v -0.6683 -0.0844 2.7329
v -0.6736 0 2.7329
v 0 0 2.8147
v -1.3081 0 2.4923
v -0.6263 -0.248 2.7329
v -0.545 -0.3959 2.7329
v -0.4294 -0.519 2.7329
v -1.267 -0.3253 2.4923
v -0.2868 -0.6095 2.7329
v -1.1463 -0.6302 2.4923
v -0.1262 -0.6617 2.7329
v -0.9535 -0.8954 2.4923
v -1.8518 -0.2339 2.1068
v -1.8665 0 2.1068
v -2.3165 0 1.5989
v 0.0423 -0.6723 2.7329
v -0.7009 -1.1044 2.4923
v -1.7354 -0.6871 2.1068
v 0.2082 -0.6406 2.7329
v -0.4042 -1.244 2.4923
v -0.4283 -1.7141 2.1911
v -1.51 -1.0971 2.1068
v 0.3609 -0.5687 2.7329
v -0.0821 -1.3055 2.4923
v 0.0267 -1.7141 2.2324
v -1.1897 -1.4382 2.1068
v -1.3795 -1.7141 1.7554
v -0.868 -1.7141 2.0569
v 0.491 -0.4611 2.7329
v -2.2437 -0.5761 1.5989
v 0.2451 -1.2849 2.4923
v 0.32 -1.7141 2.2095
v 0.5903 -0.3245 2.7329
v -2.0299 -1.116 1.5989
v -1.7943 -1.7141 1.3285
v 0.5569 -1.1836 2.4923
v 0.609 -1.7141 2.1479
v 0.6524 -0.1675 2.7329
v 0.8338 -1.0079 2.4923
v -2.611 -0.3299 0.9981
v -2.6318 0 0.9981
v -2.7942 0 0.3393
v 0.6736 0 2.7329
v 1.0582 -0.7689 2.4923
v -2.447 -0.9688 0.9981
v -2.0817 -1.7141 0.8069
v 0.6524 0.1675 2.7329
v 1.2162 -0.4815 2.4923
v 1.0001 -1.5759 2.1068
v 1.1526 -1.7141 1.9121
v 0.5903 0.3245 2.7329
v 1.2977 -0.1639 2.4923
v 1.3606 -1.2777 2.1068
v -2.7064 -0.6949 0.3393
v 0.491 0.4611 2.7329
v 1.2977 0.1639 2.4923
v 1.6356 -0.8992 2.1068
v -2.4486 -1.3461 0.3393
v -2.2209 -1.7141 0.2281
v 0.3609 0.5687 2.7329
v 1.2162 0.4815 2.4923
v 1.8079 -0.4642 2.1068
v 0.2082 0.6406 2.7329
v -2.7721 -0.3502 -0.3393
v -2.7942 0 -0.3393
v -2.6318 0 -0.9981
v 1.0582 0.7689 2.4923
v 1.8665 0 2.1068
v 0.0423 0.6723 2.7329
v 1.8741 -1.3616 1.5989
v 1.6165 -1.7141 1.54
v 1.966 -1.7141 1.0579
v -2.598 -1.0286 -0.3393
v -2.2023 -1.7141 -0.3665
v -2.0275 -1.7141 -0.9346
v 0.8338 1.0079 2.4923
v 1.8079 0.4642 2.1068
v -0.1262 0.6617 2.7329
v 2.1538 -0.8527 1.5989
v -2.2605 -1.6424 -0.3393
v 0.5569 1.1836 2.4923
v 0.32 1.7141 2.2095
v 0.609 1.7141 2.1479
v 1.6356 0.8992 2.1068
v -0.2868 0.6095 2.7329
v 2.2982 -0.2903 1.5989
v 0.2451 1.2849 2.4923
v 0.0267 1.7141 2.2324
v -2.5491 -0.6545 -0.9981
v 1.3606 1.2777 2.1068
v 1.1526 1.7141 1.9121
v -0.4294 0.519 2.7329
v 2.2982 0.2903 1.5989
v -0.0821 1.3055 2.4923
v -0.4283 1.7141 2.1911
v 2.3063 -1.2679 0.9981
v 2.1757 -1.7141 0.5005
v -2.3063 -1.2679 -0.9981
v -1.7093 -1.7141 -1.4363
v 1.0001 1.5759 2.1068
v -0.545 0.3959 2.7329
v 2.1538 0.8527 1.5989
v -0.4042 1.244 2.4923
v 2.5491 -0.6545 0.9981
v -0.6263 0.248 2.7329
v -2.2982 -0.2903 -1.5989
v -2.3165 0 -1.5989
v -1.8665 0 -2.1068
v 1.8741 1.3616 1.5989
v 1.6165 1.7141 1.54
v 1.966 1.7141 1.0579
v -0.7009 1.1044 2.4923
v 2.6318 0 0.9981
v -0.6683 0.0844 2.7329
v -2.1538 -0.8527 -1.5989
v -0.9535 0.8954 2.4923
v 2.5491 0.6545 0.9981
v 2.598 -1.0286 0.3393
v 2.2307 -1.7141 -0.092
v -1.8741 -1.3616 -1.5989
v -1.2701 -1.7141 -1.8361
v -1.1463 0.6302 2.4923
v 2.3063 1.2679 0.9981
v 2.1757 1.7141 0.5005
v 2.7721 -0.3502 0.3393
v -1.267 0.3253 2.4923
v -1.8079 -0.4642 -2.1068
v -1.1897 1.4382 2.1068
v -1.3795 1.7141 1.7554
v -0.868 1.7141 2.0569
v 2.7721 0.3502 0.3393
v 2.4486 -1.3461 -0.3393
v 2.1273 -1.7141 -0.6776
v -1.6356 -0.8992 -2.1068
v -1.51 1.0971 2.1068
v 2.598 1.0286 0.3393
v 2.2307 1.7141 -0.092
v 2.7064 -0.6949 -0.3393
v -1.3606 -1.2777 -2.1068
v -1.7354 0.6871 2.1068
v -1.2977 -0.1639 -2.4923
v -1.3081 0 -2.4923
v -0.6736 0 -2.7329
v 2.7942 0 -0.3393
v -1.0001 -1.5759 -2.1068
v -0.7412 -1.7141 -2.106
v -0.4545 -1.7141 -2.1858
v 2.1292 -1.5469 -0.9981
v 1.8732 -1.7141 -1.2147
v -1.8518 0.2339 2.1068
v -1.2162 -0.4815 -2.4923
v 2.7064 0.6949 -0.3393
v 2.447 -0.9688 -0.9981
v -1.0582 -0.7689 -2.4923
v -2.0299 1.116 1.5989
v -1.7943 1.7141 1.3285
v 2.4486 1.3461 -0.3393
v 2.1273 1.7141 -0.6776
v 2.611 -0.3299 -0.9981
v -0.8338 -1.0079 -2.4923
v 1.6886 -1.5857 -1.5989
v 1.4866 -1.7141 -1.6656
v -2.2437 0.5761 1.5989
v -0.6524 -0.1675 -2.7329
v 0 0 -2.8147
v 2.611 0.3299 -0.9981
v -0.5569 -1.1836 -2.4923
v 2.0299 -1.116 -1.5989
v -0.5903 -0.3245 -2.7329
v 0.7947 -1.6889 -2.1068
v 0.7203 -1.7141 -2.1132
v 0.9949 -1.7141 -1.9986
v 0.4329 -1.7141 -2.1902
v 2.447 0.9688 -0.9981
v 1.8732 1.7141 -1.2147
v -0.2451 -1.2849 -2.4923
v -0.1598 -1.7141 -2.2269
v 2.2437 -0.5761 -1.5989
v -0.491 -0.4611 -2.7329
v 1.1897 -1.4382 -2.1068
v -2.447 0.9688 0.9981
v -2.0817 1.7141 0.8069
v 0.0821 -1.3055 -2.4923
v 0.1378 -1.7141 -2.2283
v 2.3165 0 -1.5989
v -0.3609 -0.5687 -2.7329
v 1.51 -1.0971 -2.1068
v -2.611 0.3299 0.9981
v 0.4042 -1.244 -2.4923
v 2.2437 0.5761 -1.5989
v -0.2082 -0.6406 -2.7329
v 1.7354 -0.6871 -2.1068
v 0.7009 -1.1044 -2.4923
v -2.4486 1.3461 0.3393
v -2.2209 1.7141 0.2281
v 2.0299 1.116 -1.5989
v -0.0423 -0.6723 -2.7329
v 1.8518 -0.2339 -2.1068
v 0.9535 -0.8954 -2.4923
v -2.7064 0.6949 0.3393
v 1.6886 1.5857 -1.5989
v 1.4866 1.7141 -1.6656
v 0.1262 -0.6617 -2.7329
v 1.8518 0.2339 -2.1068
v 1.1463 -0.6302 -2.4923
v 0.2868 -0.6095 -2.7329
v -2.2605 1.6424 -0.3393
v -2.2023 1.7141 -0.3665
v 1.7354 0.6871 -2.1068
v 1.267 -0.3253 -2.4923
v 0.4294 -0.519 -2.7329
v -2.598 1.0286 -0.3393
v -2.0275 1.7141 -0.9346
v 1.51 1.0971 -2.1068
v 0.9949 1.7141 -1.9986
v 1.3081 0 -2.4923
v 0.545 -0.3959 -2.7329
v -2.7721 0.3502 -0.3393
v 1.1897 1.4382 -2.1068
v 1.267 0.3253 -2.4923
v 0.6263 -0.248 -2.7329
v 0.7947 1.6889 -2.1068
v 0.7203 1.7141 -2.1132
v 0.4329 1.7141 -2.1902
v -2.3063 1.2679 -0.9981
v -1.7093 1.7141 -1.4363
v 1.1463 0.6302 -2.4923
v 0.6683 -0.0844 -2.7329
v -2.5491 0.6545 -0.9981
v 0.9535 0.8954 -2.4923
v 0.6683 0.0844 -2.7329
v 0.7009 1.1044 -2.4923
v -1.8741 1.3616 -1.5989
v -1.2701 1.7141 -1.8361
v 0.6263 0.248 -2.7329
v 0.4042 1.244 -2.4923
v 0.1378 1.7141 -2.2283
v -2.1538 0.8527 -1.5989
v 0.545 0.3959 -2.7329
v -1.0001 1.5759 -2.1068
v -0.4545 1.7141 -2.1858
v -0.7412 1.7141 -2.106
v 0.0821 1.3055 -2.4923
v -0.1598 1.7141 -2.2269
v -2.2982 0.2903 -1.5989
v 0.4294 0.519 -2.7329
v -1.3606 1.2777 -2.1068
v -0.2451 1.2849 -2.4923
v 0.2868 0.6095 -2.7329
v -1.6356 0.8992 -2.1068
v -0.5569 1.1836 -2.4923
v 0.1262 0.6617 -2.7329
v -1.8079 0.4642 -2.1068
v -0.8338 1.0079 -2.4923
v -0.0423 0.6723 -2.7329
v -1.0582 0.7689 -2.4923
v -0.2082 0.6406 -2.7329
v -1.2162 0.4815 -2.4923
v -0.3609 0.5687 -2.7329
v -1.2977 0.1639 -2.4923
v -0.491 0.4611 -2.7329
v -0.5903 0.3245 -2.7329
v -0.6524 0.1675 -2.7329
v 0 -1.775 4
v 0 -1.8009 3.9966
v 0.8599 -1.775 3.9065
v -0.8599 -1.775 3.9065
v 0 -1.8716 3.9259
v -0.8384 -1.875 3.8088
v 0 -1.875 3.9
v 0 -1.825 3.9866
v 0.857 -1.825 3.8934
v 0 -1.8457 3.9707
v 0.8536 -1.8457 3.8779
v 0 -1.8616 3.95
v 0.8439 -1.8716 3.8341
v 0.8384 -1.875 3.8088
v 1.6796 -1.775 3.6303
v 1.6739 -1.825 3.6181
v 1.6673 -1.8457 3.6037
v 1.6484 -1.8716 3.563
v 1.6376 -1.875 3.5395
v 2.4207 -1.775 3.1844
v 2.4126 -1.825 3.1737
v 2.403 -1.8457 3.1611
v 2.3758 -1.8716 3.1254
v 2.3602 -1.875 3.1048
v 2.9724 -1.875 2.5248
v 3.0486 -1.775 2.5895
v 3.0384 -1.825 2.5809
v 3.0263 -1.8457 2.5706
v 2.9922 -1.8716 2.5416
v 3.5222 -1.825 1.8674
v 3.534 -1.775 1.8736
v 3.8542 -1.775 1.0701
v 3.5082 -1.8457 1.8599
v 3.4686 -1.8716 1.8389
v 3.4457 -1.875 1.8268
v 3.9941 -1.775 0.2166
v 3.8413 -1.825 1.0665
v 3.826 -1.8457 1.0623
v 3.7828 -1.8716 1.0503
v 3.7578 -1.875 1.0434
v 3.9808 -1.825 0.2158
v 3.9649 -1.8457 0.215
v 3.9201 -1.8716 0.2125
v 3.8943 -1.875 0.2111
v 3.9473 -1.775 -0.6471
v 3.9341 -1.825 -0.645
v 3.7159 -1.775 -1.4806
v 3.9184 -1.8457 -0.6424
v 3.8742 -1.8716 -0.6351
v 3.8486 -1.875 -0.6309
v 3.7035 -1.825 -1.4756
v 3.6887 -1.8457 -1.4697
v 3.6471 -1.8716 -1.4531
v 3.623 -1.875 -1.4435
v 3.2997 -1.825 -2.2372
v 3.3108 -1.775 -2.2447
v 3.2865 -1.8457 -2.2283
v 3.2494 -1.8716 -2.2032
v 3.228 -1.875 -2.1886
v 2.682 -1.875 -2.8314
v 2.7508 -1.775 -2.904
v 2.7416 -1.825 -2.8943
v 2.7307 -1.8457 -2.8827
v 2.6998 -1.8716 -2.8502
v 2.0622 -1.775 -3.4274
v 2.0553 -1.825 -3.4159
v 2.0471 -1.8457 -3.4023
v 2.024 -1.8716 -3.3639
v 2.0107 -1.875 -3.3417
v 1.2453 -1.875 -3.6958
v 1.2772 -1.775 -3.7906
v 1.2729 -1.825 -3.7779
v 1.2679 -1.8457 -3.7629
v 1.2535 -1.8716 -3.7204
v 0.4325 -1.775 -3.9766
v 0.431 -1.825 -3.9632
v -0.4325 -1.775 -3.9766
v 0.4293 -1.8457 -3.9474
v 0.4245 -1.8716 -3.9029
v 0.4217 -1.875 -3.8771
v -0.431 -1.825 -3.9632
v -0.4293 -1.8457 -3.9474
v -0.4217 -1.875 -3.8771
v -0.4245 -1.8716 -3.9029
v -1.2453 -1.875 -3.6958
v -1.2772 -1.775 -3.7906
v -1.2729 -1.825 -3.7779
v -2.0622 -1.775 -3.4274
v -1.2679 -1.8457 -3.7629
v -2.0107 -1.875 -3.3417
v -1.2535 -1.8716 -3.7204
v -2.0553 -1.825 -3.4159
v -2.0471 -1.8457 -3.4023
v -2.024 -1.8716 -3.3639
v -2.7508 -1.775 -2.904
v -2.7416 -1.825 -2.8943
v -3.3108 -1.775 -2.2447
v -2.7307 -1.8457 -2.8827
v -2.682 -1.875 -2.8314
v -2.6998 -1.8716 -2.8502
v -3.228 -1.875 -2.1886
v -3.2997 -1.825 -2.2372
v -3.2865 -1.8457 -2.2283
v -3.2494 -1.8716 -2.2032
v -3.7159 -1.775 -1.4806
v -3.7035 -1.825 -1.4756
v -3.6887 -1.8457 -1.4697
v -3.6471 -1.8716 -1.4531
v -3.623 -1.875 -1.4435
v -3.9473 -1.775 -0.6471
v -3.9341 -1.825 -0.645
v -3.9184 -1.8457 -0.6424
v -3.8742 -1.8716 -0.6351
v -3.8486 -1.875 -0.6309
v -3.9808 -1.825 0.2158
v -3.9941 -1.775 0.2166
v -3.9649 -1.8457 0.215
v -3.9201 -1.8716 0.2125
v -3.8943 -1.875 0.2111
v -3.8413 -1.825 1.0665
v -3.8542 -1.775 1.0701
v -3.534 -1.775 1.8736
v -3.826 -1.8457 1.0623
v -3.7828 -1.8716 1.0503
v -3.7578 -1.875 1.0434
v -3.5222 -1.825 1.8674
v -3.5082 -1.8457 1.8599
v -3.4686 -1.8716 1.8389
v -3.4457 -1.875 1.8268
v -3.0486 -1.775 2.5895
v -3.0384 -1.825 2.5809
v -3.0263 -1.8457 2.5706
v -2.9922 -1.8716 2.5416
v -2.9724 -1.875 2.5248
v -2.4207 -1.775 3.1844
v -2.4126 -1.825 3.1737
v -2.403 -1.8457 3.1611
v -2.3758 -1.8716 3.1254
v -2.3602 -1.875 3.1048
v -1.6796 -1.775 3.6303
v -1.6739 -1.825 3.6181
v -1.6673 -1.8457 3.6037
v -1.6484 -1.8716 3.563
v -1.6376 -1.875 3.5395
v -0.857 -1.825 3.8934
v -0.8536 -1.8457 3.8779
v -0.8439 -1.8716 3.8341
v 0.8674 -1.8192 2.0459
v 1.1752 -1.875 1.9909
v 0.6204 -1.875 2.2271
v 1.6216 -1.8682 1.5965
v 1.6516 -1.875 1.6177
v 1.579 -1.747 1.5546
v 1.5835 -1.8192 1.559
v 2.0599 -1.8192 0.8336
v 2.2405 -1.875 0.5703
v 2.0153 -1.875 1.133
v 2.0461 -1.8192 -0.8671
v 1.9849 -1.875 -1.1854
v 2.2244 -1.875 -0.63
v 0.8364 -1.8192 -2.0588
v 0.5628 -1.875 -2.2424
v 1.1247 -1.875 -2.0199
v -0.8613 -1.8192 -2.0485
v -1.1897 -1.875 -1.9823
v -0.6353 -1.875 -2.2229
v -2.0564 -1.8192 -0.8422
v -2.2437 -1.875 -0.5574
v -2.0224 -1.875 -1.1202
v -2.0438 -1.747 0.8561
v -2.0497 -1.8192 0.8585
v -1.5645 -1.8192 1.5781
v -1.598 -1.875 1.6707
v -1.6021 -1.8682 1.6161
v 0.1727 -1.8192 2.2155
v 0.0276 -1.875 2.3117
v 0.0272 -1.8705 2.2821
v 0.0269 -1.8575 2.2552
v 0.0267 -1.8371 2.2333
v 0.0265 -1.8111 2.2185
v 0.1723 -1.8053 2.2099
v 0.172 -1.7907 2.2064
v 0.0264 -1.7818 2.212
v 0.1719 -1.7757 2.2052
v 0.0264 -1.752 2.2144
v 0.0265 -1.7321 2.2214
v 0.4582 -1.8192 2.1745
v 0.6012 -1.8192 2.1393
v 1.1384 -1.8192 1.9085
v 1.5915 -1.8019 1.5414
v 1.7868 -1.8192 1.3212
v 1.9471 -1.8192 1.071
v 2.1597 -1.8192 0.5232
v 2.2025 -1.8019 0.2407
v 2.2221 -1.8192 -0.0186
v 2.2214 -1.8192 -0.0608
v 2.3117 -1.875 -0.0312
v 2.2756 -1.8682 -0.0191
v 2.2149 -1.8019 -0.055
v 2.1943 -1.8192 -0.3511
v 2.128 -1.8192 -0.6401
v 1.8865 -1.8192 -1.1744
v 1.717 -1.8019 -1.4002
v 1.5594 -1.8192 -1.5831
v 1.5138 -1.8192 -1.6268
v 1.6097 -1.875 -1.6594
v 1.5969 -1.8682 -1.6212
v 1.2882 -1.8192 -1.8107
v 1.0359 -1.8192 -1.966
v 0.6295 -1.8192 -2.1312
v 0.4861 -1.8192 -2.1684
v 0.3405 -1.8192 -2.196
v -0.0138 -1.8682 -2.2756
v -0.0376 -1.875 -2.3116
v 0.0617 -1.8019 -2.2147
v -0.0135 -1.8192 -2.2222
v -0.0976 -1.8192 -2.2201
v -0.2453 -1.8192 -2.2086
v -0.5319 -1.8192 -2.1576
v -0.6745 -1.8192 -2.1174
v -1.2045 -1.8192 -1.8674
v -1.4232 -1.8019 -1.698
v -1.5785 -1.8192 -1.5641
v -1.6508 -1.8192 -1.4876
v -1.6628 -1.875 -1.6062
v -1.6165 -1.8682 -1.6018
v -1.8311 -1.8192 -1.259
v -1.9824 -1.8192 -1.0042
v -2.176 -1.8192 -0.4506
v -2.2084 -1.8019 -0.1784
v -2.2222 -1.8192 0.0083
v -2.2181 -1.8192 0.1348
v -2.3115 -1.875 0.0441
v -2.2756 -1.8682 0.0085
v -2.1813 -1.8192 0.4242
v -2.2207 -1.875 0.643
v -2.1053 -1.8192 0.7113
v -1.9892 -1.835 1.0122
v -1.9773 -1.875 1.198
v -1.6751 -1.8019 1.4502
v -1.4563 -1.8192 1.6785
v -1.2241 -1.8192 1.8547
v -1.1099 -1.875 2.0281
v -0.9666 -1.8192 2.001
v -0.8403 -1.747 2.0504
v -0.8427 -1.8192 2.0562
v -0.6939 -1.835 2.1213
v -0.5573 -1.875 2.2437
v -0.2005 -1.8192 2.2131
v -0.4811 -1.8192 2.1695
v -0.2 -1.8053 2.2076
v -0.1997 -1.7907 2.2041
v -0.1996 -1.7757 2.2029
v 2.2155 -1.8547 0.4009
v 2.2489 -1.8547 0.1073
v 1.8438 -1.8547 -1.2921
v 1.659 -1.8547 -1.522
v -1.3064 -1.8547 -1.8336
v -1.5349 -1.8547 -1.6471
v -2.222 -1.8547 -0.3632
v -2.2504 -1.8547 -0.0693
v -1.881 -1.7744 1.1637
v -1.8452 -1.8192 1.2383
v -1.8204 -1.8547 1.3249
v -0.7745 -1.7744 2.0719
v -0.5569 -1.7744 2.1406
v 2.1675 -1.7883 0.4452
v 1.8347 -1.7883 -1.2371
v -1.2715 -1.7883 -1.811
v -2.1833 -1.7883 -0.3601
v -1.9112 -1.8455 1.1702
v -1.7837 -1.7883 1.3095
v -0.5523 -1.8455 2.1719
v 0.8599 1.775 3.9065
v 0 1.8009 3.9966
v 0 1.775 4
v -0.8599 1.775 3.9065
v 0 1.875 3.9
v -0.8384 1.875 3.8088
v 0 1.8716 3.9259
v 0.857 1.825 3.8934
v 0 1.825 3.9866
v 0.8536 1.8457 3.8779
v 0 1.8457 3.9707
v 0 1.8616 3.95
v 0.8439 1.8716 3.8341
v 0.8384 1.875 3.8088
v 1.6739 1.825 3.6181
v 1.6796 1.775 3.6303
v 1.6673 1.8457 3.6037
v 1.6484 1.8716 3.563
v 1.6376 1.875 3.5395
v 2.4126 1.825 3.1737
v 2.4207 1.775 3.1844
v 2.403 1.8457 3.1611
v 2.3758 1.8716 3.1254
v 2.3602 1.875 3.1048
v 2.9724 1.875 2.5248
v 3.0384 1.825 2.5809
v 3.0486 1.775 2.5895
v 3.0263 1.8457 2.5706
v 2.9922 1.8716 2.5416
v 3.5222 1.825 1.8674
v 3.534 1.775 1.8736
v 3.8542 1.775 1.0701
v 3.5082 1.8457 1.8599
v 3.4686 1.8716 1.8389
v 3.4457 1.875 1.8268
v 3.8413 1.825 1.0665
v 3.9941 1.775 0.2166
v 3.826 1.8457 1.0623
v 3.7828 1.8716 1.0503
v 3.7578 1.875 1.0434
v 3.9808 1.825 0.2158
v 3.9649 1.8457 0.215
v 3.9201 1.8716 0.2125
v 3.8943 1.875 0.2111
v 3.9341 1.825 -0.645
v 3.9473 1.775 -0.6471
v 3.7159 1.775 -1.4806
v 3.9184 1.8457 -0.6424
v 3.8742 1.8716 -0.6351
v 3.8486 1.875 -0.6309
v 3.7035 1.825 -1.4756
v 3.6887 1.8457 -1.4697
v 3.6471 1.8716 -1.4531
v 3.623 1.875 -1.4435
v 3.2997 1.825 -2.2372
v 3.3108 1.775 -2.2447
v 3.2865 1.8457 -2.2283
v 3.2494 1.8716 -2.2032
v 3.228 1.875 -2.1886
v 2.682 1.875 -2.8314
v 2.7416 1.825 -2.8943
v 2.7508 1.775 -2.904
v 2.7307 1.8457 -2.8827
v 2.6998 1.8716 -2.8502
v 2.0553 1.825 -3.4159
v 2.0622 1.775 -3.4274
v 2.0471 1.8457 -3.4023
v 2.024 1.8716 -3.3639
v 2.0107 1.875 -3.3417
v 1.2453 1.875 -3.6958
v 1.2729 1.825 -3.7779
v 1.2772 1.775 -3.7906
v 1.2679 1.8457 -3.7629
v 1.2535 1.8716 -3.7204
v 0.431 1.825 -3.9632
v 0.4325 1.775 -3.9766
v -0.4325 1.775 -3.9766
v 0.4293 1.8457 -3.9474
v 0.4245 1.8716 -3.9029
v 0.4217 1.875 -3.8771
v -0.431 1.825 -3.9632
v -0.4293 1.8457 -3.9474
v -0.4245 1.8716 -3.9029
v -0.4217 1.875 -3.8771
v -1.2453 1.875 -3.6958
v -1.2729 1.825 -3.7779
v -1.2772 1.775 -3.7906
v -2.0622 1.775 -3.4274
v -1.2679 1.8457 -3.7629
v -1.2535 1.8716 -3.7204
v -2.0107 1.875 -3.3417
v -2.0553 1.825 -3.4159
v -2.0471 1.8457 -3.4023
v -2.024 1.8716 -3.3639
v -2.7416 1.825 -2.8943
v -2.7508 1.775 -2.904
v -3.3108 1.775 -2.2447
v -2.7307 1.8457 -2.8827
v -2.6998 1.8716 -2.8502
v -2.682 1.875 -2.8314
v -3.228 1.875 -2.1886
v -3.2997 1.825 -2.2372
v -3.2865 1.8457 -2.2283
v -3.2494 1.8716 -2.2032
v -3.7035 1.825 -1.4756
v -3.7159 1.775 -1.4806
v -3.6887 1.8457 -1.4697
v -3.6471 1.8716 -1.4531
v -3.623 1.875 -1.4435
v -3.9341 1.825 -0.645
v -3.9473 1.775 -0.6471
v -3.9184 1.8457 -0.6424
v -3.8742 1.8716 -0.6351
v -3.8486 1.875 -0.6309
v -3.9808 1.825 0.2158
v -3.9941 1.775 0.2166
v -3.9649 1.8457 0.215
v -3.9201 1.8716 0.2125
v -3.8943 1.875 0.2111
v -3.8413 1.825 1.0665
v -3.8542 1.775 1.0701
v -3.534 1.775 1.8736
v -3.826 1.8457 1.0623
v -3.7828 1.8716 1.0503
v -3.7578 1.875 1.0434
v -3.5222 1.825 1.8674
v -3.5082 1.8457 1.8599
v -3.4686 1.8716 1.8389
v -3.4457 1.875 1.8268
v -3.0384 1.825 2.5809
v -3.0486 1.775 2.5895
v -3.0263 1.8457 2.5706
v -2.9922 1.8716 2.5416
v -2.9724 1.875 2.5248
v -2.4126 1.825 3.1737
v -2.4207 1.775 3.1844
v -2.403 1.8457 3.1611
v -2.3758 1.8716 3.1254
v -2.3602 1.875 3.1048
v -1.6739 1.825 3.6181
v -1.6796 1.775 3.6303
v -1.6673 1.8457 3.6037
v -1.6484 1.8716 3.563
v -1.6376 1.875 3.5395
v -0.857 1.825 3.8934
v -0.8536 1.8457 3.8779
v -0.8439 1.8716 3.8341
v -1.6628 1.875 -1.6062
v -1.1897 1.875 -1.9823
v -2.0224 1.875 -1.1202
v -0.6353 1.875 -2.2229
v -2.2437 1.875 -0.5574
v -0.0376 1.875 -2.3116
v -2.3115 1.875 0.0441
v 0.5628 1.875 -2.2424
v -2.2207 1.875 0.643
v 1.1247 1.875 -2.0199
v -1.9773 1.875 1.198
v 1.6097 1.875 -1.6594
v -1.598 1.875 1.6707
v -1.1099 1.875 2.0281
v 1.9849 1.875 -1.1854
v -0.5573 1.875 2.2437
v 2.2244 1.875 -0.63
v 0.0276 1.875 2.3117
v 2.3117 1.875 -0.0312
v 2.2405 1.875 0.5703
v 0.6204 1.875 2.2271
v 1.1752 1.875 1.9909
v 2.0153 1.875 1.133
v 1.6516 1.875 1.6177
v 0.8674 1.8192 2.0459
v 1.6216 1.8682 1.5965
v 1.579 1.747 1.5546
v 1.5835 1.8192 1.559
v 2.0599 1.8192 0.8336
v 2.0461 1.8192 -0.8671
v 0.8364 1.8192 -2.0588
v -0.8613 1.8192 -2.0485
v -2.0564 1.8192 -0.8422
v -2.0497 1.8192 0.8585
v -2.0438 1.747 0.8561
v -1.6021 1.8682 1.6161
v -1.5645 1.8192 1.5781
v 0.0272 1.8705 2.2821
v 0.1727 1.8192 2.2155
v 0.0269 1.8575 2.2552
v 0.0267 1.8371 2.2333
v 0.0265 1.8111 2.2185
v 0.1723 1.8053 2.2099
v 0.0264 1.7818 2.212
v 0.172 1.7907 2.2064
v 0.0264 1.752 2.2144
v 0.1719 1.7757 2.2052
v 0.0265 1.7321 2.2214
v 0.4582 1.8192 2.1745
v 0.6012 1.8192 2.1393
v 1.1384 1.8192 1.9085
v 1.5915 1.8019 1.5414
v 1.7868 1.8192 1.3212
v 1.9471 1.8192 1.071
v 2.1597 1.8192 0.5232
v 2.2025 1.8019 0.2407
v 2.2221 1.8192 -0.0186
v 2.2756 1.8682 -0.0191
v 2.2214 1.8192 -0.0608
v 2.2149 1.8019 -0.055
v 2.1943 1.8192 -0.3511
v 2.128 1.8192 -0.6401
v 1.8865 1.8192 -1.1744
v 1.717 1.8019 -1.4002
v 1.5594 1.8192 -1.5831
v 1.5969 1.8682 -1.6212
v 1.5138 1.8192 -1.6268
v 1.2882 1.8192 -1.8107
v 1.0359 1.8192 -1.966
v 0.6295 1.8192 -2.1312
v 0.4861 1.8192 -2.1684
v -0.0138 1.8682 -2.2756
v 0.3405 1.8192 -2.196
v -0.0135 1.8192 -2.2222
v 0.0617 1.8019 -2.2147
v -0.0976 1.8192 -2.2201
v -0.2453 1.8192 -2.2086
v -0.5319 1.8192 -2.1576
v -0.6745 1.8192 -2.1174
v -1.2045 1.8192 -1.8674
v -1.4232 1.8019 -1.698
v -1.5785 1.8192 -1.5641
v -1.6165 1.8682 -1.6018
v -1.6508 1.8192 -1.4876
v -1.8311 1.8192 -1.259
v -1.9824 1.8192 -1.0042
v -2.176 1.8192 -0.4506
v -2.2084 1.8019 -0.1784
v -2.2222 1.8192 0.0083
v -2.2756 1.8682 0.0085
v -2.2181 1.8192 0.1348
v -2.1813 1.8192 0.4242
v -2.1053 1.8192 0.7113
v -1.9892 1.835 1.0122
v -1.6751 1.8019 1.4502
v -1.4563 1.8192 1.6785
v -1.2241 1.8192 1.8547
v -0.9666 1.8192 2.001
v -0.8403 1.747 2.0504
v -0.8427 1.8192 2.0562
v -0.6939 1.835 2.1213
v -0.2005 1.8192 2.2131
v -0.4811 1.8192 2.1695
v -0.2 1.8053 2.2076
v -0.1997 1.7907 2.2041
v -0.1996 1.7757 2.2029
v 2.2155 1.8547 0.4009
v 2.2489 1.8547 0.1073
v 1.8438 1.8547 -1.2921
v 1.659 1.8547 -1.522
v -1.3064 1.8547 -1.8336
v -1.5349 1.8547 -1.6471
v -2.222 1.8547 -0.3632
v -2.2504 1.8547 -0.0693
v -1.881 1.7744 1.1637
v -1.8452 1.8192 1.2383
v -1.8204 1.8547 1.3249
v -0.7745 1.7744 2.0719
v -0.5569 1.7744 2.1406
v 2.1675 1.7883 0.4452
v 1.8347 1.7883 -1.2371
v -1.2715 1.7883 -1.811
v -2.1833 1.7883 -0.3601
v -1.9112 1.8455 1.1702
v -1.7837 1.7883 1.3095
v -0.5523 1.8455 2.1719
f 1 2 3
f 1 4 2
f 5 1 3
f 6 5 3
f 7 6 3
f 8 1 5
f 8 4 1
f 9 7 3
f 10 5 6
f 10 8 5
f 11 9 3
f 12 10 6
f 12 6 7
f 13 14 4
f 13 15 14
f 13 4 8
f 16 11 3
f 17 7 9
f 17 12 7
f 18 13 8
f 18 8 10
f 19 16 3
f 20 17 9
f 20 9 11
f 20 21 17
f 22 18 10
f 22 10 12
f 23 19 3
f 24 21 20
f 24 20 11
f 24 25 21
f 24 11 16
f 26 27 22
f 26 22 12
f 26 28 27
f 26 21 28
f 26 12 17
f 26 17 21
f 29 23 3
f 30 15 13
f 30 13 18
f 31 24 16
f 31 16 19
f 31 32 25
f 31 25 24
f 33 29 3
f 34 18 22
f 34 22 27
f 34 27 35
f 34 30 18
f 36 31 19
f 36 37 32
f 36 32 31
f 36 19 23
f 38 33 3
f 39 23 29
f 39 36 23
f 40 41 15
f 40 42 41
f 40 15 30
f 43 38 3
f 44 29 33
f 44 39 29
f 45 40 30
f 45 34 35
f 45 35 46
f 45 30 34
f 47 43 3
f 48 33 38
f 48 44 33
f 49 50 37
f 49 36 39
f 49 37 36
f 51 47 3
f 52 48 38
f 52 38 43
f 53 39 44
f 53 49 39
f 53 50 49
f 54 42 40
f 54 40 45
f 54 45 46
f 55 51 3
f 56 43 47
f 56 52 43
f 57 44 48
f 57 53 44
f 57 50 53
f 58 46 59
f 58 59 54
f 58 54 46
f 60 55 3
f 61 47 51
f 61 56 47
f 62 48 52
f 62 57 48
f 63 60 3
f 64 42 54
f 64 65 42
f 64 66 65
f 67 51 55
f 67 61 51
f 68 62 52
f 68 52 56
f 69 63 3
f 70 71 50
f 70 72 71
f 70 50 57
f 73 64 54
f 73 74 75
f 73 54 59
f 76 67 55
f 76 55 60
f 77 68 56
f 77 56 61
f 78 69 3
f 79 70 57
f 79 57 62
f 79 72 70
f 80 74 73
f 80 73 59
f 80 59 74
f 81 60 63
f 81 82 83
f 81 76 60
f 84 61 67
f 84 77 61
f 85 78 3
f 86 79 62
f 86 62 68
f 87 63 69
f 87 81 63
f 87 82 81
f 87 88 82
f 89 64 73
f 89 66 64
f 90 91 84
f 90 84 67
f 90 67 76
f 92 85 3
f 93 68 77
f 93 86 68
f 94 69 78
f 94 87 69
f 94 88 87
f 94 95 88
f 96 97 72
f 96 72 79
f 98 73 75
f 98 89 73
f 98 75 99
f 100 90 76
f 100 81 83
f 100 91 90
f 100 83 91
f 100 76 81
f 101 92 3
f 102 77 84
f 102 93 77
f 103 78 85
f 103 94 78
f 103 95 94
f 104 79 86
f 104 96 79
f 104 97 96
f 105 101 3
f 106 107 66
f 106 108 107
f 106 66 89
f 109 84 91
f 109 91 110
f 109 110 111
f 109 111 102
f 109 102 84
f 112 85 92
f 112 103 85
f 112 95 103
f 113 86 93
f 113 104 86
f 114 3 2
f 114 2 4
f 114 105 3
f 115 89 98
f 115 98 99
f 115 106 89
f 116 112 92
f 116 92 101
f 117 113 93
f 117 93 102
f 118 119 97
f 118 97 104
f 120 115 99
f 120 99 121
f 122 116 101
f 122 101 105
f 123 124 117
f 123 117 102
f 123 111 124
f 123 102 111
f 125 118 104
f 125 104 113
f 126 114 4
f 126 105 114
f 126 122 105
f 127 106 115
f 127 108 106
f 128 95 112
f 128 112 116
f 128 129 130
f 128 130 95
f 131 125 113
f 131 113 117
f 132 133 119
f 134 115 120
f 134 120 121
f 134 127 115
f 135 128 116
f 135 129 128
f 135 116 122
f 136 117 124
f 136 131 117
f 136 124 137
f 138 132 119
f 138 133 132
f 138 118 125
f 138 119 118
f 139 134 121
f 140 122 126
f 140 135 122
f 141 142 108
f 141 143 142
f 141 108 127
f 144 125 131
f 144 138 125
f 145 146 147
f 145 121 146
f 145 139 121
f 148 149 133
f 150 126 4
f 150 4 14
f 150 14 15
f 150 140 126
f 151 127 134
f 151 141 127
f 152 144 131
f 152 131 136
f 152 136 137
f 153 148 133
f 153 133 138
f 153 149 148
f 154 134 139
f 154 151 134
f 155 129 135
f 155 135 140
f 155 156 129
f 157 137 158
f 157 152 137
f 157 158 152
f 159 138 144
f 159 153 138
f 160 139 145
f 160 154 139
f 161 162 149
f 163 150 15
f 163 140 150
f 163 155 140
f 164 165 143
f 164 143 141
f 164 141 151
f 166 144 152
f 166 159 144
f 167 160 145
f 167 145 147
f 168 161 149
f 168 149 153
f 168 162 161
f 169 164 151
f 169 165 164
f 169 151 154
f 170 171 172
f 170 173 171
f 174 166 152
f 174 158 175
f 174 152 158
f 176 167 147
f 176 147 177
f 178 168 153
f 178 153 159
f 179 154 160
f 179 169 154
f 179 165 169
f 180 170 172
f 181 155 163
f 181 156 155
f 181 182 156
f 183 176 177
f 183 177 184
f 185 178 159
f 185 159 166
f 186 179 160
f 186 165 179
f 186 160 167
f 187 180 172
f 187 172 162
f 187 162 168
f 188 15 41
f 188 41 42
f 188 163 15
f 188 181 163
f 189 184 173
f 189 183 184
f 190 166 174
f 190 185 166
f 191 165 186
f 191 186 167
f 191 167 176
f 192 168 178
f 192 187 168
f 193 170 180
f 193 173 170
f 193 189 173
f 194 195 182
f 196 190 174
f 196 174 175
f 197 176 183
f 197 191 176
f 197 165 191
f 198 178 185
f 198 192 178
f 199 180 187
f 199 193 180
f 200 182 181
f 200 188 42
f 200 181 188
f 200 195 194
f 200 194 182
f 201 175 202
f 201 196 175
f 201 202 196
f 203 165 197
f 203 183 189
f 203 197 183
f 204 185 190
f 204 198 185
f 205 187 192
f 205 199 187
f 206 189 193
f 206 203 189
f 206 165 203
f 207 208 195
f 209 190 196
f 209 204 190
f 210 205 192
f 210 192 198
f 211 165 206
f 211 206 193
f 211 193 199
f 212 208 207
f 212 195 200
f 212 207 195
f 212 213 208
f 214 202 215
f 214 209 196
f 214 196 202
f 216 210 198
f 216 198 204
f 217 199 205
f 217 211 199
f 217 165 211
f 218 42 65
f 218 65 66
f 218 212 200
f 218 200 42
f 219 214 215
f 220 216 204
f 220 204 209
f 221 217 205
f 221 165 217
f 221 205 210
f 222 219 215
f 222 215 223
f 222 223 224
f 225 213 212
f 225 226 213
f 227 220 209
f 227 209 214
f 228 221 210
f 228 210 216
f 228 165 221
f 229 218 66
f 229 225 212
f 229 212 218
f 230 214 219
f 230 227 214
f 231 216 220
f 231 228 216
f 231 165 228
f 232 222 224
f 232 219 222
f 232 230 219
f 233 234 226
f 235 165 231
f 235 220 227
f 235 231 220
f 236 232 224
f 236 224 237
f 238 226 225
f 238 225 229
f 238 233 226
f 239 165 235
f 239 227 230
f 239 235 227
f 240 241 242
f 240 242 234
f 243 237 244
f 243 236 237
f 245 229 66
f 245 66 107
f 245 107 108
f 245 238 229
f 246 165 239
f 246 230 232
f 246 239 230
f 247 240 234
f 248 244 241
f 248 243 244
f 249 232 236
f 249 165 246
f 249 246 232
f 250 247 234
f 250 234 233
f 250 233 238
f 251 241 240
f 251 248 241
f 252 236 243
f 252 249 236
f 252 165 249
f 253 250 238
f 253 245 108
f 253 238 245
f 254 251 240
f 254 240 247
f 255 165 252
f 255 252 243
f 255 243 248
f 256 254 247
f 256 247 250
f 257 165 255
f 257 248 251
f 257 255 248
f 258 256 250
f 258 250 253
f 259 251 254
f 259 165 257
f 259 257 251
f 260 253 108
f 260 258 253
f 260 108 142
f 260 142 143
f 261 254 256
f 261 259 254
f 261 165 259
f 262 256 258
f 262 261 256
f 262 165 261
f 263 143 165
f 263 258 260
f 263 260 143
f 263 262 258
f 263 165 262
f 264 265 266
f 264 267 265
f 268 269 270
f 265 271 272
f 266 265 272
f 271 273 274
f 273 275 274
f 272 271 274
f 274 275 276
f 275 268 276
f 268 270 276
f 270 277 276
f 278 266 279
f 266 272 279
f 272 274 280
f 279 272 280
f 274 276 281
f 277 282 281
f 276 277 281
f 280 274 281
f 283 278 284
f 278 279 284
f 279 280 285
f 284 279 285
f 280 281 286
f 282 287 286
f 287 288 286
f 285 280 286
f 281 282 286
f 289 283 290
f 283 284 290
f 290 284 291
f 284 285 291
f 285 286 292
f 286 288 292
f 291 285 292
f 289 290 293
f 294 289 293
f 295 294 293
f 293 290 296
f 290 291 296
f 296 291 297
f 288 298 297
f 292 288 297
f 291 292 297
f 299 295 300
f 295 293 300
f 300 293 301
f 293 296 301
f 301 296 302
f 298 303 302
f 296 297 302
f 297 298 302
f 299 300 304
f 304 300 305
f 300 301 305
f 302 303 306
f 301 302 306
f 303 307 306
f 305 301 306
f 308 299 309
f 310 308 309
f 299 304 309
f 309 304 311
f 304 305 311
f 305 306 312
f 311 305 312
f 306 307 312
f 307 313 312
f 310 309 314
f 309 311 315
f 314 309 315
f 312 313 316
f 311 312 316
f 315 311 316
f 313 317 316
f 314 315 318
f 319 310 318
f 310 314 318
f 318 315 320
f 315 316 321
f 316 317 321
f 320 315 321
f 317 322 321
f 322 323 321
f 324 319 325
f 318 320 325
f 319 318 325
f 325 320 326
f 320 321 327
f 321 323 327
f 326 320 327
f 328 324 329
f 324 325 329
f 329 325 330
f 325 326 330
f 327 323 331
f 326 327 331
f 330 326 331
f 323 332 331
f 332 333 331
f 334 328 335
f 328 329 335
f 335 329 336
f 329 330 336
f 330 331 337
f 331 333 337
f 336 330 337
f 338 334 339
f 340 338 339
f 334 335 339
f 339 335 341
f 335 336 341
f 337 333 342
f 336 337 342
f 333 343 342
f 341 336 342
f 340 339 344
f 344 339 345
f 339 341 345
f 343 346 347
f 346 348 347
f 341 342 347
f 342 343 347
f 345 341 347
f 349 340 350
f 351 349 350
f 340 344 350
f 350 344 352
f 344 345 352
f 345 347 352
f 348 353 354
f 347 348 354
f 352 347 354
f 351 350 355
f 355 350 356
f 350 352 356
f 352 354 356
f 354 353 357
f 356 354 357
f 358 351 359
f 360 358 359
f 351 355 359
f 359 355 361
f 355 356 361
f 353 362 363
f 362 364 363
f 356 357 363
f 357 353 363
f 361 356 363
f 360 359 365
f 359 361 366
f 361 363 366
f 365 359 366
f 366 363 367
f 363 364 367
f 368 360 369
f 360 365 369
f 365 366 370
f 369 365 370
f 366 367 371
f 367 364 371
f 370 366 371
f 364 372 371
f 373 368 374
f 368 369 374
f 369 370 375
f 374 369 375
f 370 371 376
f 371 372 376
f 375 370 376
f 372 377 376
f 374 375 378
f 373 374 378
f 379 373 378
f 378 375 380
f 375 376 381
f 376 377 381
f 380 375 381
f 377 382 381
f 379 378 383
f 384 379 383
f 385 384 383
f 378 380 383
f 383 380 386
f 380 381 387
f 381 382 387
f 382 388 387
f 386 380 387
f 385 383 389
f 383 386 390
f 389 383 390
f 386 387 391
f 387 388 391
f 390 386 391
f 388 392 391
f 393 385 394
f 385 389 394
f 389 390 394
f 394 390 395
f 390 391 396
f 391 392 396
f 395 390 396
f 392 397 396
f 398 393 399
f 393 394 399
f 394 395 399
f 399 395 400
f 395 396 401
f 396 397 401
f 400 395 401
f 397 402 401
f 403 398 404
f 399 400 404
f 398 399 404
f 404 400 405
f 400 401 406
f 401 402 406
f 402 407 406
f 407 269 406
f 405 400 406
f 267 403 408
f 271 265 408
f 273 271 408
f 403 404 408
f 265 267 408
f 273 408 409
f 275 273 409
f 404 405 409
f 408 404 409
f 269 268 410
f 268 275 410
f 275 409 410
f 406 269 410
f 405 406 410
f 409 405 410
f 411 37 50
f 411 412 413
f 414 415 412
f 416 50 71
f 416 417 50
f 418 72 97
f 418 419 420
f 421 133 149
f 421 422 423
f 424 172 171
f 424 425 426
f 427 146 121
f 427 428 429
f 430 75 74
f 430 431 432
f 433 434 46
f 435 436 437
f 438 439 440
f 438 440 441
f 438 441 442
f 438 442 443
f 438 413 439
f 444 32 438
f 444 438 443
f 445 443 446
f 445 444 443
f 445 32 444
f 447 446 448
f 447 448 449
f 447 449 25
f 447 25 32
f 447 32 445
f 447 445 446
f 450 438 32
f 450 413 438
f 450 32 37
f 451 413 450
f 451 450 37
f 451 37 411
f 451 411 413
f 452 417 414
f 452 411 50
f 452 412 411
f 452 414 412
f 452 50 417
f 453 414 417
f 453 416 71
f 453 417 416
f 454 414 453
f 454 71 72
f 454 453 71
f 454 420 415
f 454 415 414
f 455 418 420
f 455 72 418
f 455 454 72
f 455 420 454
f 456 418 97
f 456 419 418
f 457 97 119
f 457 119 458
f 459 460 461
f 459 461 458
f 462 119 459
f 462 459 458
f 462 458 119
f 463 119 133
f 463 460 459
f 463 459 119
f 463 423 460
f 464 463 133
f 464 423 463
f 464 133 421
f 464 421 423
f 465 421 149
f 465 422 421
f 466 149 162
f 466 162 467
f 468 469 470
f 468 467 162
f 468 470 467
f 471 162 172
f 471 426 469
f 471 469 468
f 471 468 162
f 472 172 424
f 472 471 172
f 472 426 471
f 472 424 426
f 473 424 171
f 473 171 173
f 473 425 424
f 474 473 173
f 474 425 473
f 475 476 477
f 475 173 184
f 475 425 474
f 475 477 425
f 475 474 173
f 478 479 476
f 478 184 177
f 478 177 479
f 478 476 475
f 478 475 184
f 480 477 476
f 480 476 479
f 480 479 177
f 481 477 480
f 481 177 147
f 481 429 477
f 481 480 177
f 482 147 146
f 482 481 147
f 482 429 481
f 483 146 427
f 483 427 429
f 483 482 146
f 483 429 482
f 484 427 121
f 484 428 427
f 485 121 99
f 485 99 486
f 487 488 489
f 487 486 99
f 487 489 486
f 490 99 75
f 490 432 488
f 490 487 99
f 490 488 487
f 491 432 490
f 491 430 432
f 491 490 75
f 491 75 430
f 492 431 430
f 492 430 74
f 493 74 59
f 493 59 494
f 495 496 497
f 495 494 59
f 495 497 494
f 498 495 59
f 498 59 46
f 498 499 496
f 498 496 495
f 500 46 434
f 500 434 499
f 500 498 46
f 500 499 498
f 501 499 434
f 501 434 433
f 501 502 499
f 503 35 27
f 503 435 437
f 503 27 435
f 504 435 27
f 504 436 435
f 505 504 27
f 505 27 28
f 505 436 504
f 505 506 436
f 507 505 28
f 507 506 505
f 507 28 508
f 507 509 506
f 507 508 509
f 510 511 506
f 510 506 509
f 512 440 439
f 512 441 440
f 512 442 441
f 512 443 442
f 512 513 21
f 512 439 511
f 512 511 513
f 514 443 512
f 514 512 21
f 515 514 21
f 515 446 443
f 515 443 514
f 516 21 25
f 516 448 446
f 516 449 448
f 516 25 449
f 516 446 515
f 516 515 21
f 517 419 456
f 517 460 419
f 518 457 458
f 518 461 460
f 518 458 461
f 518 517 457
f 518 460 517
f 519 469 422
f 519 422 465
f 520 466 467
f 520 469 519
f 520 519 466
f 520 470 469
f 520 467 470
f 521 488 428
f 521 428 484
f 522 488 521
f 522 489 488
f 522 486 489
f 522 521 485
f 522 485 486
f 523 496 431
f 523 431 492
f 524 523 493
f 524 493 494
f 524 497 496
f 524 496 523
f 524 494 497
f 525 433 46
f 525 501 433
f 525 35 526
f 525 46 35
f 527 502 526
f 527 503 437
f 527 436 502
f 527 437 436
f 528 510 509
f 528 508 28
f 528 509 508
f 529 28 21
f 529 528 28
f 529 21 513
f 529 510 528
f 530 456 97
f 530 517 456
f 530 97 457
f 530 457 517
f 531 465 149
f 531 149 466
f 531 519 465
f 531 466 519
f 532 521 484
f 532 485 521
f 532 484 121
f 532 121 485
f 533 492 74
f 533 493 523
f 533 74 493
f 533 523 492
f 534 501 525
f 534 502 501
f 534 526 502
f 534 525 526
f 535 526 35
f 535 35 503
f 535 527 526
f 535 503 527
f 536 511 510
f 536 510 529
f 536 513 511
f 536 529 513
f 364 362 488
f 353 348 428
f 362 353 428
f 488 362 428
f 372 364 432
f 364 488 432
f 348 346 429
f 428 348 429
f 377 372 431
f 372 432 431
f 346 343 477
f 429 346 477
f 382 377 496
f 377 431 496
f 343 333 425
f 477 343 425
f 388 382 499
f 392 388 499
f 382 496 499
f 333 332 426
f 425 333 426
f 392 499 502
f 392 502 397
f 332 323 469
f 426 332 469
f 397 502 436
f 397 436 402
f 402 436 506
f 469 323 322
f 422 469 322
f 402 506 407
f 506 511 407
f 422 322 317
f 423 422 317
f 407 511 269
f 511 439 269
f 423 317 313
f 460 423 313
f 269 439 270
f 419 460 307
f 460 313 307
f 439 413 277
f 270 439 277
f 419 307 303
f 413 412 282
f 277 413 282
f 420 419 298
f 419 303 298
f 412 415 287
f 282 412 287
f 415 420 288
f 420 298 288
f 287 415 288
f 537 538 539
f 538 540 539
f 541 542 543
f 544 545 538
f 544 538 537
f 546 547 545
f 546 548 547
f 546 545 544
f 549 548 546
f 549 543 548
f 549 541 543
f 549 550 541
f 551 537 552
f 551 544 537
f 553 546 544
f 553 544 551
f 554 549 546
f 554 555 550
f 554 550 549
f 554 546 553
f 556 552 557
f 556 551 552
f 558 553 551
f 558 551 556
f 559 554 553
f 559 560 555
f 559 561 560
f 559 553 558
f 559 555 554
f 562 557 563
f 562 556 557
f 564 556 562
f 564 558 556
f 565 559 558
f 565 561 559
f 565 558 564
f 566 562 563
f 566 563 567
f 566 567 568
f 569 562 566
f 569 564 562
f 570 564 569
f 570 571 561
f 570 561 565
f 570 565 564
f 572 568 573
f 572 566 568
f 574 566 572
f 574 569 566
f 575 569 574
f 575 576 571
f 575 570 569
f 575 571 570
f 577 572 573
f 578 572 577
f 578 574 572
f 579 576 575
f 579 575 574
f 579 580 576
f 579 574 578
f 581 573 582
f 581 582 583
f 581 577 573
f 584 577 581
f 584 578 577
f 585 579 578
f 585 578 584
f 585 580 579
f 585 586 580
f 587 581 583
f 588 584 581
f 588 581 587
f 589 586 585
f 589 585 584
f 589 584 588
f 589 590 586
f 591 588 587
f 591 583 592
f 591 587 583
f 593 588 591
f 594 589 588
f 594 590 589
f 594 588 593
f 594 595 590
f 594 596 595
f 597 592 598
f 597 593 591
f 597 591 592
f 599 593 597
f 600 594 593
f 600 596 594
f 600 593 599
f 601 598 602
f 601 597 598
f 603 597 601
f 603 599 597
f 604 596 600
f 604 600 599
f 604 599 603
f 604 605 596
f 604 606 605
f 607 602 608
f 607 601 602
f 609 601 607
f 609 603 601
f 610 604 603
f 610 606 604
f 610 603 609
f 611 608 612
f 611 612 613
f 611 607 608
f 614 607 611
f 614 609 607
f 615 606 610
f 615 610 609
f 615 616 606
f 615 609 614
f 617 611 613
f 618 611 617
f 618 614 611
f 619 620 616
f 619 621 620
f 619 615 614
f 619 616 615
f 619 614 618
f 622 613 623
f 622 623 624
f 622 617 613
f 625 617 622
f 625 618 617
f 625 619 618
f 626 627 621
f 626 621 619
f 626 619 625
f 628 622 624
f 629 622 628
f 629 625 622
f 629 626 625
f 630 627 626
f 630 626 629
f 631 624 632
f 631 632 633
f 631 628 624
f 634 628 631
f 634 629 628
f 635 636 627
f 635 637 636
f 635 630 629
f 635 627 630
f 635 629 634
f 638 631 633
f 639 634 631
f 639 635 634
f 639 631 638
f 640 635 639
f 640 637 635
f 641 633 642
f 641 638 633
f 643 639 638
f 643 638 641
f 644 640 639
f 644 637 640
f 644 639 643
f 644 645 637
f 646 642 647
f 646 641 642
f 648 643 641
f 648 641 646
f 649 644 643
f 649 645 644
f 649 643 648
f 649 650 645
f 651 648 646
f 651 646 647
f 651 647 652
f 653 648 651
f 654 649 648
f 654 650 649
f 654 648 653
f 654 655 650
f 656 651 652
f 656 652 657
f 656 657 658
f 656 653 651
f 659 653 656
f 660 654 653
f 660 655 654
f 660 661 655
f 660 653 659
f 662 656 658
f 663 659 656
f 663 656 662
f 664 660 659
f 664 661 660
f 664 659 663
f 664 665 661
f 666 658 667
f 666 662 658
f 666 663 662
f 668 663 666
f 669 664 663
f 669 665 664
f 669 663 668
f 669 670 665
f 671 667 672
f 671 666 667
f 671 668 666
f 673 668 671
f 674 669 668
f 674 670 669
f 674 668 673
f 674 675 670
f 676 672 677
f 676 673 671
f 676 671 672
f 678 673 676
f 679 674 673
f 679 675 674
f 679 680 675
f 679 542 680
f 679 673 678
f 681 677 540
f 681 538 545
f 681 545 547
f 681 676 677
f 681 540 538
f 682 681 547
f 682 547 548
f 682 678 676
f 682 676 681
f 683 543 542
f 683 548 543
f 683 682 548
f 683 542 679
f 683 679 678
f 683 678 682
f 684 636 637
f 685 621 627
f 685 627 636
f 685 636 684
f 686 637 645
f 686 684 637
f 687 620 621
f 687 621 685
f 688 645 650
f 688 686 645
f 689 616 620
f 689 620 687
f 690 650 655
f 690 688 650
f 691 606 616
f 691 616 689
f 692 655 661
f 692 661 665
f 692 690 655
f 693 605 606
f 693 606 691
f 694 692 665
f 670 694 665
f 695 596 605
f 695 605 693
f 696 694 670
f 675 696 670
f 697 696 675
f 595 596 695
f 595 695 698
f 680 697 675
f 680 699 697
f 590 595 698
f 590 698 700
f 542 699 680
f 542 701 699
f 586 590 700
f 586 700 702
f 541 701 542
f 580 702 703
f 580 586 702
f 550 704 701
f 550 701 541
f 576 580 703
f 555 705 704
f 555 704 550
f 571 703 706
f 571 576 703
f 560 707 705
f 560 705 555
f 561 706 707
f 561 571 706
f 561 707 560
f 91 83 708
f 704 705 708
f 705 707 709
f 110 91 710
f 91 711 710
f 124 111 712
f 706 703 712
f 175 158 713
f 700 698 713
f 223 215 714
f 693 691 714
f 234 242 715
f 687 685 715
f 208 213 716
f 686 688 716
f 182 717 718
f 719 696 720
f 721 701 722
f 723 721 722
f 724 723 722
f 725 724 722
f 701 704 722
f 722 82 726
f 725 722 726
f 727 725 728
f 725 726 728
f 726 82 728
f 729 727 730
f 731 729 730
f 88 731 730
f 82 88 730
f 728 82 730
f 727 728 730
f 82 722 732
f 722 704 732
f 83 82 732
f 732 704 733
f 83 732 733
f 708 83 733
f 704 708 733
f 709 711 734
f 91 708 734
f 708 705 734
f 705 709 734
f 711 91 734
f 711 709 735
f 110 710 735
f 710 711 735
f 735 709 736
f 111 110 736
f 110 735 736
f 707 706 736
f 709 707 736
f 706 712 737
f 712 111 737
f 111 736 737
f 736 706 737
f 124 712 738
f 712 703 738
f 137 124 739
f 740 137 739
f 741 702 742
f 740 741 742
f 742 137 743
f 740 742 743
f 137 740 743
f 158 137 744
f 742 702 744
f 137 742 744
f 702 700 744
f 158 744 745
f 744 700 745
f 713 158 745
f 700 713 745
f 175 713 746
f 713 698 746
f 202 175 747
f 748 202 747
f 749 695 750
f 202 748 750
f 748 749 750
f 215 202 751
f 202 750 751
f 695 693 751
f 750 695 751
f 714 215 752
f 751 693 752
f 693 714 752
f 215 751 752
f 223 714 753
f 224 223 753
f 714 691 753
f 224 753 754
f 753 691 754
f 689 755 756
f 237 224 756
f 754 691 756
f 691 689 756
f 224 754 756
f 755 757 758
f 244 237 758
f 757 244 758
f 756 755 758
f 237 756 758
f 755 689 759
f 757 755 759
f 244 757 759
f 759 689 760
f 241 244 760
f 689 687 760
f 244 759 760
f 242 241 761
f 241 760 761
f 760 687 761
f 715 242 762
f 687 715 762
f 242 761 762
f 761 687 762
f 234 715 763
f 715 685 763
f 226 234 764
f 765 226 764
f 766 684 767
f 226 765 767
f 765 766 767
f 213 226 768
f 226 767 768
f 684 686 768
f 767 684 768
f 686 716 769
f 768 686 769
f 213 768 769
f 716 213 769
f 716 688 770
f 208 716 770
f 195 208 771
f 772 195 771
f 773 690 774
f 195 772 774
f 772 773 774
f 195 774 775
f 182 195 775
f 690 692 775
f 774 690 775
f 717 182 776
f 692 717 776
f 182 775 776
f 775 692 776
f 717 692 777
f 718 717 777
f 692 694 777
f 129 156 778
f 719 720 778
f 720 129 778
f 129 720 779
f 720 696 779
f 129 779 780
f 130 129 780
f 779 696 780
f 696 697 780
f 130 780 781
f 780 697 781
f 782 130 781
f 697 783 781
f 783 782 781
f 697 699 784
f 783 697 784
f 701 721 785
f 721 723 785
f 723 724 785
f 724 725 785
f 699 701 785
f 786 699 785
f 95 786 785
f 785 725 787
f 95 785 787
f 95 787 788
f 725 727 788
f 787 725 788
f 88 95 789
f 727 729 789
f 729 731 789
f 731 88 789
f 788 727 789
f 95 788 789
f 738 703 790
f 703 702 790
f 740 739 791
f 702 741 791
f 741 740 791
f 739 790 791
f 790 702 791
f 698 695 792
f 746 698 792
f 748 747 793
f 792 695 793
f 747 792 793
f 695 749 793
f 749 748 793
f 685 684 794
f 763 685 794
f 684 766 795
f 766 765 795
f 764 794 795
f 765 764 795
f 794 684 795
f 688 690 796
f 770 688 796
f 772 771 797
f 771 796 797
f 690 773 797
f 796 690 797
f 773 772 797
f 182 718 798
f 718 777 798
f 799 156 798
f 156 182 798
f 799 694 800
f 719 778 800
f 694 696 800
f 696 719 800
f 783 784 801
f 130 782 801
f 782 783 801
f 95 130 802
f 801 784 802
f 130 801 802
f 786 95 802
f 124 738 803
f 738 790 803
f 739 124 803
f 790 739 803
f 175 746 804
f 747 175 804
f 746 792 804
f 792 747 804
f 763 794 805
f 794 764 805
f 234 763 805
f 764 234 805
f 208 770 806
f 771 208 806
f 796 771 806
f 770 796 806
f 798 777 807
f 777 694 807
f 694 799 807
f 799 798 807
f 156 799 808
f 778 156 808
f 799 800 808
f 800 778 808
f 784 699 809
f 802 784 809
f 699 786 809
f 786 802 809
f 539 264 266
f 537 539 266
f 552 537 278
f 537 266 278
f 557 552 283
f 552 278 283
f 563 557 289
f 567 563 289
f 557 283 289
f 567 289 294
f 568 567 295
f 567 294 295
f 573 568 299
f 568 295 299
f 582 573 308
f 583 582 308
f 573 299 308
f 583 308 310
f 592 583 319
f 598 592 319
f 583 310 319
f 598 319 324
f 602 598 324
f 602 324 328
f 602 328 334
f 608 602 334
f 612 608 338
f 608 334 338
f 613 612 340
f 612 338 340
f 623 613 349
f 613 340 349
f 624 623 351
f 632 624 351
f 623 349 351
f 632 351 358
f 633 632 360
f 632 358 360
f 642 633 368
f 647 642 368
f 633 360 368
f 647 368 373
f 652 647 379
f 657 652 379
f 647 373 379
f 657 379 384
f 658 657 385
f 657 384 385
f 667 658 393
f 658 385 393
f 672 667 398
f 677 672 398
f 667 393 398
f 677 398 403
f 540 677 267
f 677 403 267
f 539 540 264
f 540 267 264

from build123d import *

# Parameters (mm, degrees)
BOSS_EXTRUDE1_DEPTH      = 1.875
BOSS_EXTRUDE1_DEPTH_BACK = 1.875
SKETCH2_R                = 4
SKETCH2_R_2              = 2
FILLET1_R                = 0.1


with BuildPart() as part:
    # Sketch2 → Boss-Extrude1 (new, two sides: drawn at the far end of the back side and taken through both)
    with BuildSketch(Plane(origin=(0, 0, 0), x_dir=(1, 0, 0), z_dir=(0, 1, 0)).offset(-BOSS_EXTRUDE1_DEPTH_BACK)):
        Circle(SKETCH2_R)
        Circle(SKETCH2_R_2, mode=Mode.SUBTRACT)
    extrude(amount=BOSS_EXTRUDE1_DEPTH + BOSS_EXTRUDE1_DEPTH_BACK)


with BuildPart() as body_2:
    # Sketch4 → Revolve1 (revolve)
    with BuildSketch(Plane(origin=(0, 0, 0), x_dir=(1, 0, 0), z_dir=(0, 1, 0))):
        with BuildLine():
            Line((0, 2.81470199), (0, -2.81470199))
            ThreePointArc((0, -2.81470199), (-2.81470199, 0), (0, 2.81470199))
        make_face()
    revolve(axis=Axis((0, 0, -2.81470199), (0, 0, 1)))


with BuildPart() as part_1:
    add(part.part)

    # Combine2: cut body 2
    add(body_2.part, mode=Mode.SUBTRACT)

    # Fillet1
    fillet1_edges = [part_1.edges().sort_by_distance(p)[0] for p in [
        (-4, -1.875, 0),
        (-4, 1.875, 0),
        (0, -1.875, -2.099267085),
        (0, 1.875, -2.099267085),
    ]]
    fillet(fillet1_edges, radius=FILLET1_R)


solid = part_1.part
